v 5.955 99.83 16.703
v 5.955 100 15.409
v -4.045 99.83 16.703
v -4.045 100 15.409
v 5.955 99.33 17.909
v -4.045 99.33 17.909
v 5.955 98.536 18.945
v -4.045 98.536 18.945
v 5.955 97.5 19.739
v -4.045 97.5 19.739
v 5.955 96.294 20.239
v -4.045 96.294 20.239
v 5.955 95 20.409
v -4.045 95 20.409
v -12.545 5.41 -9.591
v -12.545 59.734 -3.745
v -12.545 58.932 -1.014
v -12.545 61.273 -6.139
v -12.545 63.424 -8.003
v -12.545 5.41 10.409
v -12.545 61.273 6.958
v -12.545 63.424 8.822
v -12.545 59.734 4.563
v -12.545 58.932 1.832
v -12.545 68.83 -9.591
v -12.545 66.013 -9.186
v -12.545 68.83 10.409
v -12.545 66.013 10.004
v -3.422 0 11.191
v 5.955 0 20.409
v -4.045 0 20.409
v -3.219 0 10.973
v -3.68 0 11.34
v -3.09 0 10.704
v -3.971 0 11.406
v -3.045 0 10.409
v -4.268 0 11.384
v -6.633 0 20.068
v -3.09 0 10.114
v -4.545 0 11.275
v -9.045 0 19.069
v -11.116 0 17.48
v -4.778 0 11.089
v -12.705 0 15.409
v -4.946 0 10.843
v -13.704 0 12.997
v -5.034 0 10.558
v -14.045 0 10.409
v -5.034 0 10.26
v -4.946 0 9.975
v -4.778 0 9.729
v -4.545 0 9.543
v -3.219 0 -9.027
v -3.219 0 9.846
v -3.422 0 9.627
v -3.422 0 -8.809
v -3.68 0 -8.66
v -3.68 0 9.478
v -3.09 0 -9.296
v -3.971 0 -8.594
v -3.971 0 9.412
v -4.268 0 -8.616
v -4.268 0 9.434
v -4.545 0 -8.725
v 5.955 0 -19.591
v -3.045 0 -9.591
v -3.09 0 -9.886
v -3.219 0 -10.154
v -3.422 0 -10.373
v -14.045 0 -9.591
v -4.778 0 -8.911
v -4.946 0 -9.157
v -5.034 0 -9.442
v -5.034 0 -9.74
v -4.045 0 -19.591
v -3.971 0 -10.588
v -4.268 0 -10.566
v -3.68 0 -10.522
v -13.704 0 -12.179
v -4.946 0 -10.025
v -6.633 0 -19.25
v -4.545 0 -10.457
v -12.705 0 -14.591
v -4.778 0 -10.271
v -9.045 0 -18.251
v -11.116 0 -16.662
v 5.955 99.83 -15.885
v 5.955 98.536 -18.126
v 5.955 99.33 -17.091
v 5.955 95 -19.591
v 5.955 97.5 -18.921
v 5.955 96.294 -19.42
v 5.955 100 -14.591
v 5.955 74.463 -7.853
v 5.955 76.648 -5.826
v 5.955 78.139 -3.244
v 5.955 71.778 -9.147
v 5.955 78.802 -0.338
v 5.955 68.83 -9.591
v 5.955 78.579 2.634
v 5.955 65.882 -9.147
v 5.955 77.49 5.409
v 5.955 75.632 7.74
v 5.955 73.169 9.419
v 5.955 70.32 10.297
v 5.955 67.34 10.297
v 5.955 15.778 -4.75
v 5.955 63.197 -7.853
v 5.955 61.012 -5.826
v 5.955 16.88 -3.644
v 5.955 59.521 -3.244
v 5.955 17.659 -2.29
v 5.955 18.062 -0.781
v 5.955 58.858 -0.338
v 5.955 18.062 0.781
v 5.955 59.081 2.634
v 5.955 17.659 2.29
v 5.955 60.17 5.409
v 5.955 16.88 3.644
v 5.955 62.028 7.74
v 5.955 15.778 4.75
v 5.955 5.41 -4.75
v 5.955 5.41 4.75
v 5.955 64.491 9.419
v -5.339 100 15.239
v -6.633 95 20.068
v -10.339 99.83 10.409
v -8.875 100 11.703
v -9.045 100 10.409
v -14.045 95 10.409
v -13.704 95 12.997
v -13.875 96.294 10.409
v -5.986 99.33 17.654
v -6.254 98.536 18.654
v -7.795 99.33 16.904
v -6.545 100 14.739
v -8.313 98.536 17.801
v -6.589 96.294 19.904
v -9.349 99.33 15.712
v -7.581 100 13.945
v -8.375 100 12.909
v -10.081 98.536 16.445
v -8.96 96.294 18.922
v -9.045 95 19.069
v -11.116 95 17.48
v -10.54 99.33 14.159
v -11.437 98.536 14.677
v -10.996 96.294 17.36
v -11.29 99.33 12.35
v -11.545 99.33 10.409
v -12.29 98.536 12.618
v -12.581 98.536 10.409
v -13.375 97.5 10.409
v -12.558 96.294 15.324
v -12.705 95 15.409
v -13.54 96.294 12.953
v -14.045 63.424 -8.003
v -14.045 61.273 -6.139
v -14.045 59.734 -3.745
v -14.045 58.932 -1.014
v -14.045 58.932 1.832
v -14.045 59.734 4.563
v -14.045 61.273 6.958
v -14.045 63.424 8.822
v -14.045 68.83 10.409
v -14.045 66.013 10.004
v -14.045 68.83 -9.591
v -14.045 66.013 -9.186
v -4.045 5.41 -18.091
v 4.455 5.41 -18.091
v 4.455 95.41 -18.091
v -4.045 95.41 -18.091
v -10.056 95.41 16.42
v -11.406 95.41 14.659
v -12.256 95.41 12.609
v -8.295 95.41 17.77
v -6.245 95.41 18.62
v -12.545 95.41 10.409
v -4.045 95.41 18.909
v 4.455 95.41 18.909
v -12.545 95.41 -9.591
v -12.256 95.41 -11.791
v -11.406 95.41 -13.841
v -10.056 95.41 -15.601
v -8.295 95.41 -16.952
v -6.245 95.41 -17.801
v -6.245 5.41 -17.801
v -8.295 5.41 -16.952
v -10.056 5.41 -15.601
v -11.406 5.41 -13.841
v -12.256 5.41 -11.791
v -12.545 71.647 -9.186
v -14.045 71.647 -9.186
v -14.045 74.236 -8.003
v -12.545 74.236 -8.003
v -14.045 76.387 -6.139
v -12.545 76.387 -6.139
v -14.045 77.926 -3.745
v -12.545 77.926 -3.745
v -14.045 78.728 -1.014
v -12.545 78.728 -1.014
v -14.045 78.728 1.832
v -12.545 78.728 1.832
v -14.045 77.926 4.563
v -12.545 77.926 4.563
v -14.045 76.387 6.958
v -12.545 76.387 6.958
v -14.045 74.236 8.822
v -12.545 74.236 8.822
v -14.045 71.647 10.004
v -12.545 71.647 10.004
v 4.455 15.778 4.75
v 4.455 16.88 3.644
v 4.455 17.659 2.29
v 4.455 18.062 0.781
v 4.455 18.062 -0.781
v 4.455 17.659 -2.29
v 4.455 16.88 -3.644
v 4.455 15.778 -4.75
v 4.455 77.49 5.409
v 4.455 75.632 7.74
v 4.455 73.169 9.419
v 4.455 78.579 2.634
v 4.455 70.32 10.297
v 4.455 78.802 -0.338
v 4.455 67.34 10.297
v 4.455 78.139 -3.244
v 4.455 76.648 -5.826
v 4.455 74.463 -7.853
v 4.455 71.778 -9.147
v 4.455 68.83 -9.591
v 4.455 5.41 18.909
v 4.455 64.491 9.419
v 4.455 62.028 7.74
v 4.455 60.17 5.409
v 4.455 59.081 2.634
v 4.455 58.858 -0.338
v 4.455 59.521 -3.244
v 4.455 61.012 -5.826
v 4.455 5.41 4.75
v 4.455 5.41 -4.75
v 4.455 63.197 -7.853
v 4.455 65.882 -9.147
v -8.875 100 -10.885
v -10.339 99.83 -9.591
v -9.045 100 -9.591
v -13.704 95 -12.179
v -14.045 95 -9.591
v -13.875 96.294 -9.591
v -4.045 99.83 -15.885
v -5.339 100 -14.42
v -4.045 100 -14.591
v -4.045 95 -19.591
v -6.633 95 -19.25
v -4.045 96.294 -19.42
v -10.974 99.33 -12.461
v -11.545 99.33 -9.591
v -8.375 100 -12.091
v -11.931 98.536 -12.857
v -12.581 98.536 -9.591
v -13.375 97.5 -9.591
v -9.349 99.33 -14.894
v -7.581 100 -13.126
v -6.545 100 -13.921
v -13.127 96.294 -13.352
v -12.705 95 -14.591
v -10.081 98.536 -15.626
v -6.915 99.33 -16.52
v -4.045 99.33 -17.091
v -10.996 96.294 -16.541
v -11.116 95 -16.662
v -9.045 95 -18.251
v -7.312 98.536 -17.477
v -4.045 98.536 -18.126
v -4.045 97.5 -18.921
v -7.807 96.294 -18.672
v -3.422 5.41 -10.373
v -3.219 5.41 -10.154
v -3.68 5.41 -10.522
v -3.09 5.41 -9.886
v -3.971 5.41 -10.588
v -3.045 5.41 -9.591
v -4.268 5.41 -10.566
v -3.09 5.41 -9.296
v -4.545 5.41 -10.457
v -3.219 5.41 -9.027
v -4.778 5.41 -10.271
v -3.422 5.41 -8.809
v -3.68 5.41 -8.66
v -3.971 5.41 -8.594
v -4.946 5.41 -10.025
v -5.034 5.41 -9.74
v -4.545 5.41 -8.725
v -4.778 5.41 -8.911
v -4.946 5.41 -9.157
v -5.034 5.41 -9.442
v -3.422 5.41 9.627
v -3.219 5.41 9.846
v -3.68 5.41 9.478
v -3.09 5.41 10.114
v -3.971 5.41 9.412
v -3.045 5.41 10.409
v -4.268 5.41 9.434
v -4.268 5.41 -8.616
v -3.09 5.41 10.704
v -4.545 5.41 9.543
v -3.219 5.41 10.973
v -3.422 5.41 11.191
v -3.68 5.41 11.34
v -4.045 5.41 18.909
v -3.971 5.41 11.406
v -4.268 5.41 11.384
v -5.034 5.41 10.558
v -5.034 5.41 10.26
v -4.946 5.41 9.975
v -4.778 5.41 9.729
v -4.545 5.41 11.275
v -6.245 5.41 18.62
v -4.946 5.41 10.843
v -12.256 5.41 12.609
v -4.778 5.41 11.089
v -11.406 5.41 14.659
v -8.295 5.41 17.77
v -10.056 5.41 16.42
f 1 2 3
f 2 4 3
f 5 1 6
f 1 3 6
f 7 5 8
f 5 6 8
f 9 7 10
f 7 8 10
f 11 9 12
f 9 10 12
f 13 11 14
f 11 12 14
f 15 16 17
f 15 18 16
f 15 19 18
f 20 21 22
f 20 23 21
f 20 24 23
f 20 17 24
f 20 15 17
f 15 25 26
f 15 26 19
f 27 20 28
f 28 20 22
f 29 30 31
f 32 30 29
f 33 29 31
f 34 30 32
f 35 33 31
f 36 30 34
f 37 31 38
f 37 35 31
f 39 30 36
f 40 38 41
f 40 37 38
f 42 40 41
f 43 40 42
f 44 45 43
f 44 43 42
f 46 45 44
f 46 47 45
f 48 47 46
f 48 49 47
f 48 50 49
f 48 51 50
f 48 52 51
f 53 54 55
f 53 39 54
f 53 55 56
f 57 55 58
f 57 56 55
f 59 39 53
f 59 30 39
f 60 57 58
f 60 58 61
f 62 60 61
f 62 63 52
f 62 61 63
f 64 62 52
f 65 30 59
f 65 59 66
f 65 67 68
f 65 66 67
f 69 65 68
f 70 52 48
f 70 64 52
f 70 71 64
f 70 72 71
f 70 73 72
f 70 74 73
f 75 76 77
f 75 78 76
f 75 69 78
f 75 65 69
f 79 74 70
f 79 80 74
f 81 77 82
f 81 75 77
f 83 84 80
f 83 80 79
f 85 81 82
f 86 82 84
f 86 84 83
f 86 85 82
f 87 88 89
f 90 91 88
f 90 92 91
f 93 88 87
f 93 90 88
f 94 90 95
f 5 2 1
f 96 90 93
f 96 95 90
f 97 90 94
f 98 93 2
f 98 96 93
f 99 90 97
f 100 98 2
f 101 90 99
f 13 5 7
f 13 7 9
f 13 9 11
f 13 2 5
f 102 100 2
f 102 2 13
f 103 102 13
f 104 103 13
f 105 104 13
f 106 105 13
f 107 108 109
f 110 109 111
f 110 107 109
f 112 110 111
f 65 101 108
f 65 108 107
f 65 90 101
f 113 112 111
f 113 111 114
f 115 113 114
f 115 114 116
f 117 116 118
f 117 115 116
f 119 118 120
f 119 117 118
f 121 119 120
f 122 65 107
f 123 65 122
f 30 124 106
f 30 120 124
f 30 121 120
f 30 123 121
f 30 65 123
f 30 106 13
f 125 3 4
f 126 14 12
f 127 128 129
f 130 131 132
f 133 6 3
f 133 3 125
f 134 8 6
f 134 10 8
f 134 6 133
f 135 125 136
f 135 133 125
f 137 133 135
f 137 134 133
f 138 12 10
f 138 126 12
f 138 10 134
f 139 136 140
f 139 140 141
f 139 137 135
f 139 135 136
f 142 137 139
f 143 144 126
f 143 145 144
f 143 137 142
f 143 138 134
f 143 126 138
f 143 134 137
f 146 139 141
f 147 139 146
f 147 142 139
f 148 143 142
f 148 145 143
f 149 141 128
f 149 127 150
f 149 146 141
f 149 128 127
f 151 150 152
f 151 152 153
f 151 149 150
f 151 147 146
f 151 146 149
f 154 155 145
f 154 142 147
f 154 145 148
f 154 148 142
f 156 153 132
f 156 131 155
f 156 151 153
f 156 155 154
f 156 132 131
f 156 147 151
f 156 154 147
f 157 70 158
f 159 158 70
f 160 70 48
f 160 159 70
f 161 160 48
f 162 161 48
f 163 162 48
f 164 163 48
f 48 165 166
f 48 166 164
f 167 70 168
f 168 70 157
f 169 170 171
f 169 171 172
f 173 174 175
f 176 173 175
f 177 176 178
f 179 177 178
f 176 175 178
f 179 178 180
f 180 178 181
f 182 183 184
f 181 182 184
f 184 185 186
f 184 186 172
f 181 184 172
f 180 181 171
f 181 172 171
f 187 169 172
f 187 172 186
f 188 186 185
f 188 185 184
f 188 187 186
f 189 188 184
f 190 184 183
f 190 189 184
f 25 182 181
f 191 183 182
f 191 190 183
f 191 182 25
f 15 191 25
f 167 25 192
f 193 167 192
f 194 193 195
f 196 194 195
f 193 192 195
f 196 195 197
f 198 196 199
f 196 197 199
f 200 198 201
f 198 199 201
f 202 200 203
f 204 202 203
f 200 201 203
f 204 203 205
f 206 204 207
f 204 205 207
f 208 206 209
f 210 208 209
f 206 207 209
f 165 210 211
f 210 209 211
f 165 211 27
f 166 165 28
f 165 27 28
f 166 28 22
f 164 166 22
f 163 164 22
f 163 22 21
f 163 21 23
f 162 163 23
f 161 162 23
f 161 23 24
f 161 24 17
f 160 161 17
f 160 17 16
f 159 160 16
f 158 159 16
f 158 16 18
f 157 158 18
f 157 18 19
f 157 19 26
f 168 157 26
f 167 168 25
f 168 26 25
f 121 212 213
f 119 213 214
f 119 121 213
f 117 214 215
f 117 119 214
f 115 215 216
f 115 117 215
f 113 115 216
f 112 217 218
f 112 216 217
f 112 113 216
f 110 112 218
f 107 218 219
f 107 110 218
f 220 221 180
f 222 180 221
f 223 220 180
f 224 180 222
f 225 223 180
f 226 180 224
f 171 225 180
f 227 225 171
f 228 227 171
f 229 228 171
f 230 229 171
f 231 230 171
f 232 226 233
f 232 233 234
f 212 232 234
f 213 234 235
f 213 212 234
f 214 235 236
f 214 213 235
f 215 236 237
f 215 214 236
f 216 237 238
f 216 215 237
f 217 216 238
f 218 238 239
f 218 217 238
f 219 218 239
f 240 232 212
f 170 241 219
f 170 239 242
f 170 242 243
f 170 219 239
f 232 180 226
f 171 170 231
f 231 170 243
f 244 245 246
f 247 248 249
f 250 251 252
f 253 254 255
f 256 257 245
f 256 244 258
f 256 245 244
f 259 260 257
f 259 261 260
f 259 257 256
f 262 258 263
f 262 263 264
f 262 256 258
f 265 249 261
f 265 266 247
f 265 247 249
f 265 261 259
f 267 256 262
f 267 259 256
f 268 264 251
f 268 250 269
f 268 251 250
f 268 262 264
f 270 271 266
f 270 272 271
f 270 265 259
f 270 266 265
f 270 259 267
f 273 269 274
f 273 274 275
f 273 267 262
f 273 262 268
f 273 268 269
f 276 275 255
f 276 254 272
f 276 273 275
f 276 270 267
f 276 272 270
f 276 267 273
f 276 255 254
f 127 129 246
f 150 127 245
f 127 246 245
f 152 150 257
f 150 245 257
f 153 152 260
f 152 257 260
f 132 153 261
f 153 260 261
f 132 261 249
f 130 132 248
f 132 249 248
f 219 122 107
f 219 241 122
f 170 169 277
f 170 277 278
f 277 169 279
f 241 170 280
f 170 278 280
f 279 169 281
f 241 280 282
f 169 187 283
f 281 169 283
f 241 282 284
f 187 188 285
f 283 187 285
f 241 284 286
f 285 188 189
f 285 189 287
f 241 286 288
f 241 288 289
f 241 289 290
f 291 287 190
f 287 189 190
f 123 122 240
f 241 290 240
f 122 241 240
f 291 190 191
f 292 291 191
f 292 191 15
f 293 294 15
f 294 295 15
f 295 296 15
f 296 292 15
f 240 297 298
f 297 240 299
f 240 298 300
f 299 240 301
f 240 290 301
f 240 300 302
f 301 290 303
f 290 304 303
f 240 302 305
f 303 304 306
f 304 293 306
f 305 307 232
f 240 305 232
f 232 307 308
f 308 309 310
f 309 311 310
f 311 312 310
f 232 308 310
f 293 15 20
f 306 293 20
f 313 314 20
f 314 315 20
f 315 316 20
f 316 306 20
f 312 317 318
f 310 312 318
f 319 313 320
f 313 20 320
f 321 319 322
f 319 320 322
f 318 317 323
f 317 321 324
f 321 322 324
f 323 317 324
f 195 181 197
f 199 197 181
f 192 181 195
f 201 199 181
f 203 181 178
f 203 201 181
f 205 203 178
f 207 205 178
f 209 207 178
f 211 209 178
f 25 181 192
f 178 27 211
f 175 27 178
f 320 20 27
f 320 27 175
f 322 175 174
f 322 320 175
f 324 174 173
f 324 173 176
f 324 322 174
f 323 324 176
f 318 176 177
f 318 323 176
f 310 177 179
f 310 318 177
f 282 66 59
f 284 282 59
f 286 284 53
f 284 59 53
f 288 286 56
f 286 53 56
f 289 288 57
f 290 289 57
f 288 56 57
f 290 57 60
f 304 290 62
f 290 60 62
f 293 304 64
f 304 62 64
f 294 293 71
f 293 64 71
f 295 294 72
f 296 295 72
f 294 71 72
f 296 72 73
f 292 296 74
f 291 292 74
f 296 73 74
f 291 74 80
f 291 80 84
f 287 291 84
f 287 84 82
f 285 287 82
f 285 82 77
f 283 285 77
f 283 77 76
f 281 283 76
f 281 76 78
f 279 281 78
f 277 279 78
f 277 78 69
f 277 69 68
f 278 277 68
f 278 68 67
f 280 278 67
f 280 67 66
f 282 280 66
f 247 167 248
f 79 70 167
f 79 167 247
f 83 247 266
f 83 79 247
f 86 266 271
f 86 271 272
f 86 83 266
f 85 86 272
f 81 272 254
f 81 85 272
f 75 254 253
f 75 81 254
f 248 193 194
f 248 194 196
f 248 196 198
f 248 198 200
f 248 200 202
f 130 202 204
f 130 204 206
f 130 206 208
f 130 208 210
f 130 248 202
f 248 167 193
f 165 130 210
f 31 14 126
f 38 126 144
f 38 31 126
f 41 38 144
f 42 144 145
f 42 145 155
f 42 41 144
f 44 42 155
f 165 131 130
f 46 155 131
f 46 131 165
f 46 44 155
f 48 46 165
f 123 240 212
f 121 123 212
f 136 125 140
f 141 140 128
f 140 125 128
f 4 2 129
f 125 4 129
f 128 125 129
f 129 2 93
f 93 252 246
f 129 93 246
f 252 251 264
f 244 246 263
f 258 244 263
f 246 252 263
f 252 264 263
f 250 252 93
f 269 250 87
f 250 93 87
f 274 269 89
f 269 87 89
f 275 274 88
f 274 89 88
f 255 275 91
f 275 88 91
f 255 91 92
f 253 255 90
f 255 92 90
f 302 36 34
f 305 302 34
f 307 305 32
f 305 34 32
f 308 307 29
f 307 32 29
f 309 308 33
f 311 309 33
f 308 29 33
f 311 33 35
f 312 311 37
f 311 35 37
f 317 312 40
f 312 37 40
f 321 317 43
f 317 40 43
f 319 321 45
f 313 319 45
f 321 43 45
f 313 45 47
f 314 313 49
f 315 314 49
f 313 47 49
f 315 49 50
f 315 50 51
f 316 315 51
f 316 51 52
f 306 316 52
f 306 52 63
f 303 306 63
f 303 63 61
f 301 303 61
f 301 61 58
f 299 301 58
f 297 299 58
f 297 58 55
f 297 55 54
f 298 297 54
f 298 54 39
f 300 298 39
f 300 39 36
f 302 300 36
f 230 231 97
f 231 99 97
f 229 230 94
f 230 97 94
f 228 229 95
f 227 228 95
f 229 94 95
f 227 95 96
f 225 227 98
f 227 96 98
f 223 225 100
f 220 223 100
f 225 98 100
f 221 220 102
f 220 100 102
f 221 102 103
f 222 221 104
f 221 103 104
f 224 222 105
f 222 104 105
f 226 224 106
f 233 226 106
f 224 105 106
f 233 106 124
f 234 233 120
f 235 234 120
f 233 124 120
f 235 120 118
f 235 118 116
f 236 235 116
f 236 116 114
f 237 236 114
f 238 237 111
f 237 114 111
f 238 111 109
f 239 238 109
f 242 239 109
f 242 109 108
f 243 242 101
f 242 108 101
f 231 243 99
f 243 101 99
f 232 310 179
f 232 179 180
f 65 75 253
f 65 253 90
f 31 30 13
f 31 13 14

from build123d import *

# Parameters (mm, degrees)
BOSS_EXTRUDE1_DEPTH = 100
SKETCH2_R           = 10
CUT_EXTRUDE1_DEPTH  = 7.5
CUT_EXTRUDE2_DEPTH  = 4.75
SKETCH6_R           = 1
CUT_EXTRUDE3_DEPTH  = 6
SKETCH7_W           = 9.5
SKETCH7_H           = 7.367856256
CUT_EXTRUDE4_DEPTH  = 6
SKETCH8_W           = 9.5
SKETCH8_H           = 7.367856256
BOSS_EXTRUDE2_DEPTH = 12.5
SKETCH10_R          = 10
CUT_EXTRUDE5_DEPTH  = 68
FILLET1_R           = 5
CUT_EXTRUDE6_DEPTH  = 5
SKETCH13_W          = 9.5
SKETCH13_H          = 3
CUT_EXTRUDE7_DEPTH  = 5
CUT_EXTRUDE8_DEPTH  = 12.5
CUT_EXTRUDE9_DEPTH  = 5
SKETCH17_W          = 11
SKETCH17_H          = 9.5
CUT_EXTRUDE11_DEPTH = 90


with BuildPart() as part:
    # Sketch1 → Boss-Extrude1 (new body)
    with BuildSketch(Plane(origin=(0, 0, 0), x_dir=(1, 0, 0), z_dir=(0, 1, 0))):
        with BuildLine():
            Line((-4.0452326, 19.590813971), (5.9547674, 19.590813971))
            Line((5.9547674, 19.590813971), (5.9547674, -0.409186029))
            Line((5.9547674, -0.409186029), (5.9547674, -20.409186029))
            Line((5.9547674, -20.409186029), (-4.0452326, -20.409186029))
            ThreePointArc((-4.0452326, -20.409186029), (-11.116300412, -17.48025384), (-14.0452326, -10.409186029))
            Line((-14.0452326, -10.409186029), (-14.0452326, 9.590813971))
            ThreePointArc((-14.0452326, 9.590813971), (-11.116300412, 16.661881783), (-4.0452326, 19.590813971))
        make_face()
    extrude(amount=BOSS_EXTRUDE1_DEPTH)

    # Sketch2 → Cut-Extrude1 (cut)
    with BuildSketch(Plane(origin=(5.9547674, 0, 0), x_dir=(0, 0, -1), z_dir=(1, 0, 0))):
        with Locations((-0.409186029, 68.83)):
            Circle(SKETCH2_R)
    extrude(amount=-CUT_EXTRUDE1_DEPTH, mode=Mode.SUBTRACT)

    # Sketch4 → Cut-Extrude2 (cut, symmetric)
    with BuildSketch(Plane.XY):
        Polygon((-1.5452326, 89.777572113), (3.4547674, 89.777572113), (3.4547674, 12.777572113), (3.4547674, 5.409715857), (-15.452876316, 5.409715857), (-15.452876316, 12.777572113), (-1.5452326, 12.777572113), align=None)
    extrude(amount=CUT_EXTRUDE2_DEPTH, both=True, mode=Mode.SUBTRACT)

    # Sketch6 → Cut-Extrude3 (cut)
    with BuildSketch(Plane.XZ):
        with Locations((-4.0452326, -9.590813971)):
            Circle(SKETCH6_R)
        with Locations((-4.0452326, 10.409186029)):
            Circle(SKETCH6_R)
    extrude(amount=-CUT_EXTRUDE3_DEPTH, mode=Mode.SUBTRACT)

    # Sketch7 → Cut-Extrude4 (cut)
    with BuildSketch(Plane.ZY.offset(-3.4547674)):
        with Locations((0, 9.093643985)):
            Rectangle(SKETCH7_W, SKETCH7_H)
    extrude(amount=-CUT_EXTRUDE4_DEPTH, mode=Mode.SUBTRACT)

    # Sketch8 → Boss-Extrude2 (add)
    with BuildSketch(Plane.ZY.offset(14.0452326)):
        with Locations((0, 9.093643985)):
            Rectangle(SKETCH8_W, SKETCH8_H)
    extrude(amount=-BOSS_EXTRUDE2_DEPTH)

    # Sketch10 → Cut-Extrude5 (cut)
    with BuildSketch(Plane(origin=(5.9547674, 0, 0), x_dir=(0, 0, -1), z_dir=(1, 0, 0))):
        with Locations((-0.409186029, 68.83)):
            Circle(SKETCH10_R)
    extrude(amount=-CUT_EXTRUDE5_DEPTH, mode=Mode.SUBTRACT)

    # Fillet1
    fillet1_edges = [part.edges().sort_by_distance(p)[0] for p in [
        (-11.116300412, 100, -16.661881783),
        (-14.0452326, 100, 0.409186029),
        (-11.116300412, 100, 17.48025384),
        (0.9547674, 100, 20.409186029),
        (0.9547674, 100, -19.590813971),
    ]]
    fillet(fillet1_edges, radius=FILLET1_R)

    # Sketch11 → Cut-Extrude6 (cut)
    with BuildSketch(Plane(origin=(-1.5452326, 0, 0), x_dir=(0, 0, -1), z_dir=(1, 0, 0))):
        with BuildLine():
            Line((-4.75, 59.821263459), (-4.75, 5.409715857))
            Line((-4.75, 5.409715857), (4.75, 5.409715857))
            Line((4.75, 5.409715857), (4.75, 60.263623898))
            ThreePointArc((4.75, 60.263623898), (0.055952548, 58.840823552), (-4.75, 59.821263459))
        make_face()
    extrude(amount=-CUT_EXTRUDE6_DEPTH, mode=Mode.SUBTRACT)

    # Sketch13 → Cut-Extrude7 (cut)
    with BuildSketch(Plane(origin=(5.9547674, 0, 0), x_dir=(0, 0, -1), z_dir=(1, 0, 0))):
        with Locations((0, 14.277572113)):
            Rectangle(SKETCH13_W, SKETCH13_H)
    extrude(amount=-CUT_EXTRUDE7_DEPTH, mode=Mode.SUBTRACT)

    # Sketch14 → Cut-Extrude8 (cut)
    with BuildSketch(Plane(origin=(5.9547674, 0, 0), x_dir=(0, 0, -1), z_dir=(1, 0, 0))):
        with BuildLine():
            Line((4.75, 15.777572113), (-4.75, 15.777572113))
            ThreePointArc((-4.75, 15.777572113), (0, 18.113561026), (4.75, 15.777572113))
        make_face()
    extrude(amount=-CUT_EXTRUDE8_DEPTH, mode=Mode.SUBTRACT)

    # Sketch16 → Cut-Extrude9 (cut)
    with BuildSketch(Plane(origin=(-1.5452326, 0, 0), x_dir=(0, 0, -1), z_dir=(1, 0, 0))):
        with BuildLine():
            ThreePointArc((-4.75, 89.777572113), (0, 93.055148297), (4.75, 89.777572113))
            Line((4.75, 89.777572113), (-4.75, 89.777572113))
        make_face()
    extrude(amount=CUT_EXTRUDE9_DEPTH, mode=Mode.SUBTRACT)

    # Sketch17 → Cut-Extrude11 (cut)
    with BuildSketch(Plane(origin=(0, 5.409715857, 0), x_dir=(1, 0, 0), z_dir=(0, 1, 0))):
        with BuildLine():
            Line((4.4547674, 4.75), (4.4547674, 18.090813971))
            Line((4.4547674, 18.090813971), (-4.0452326, 18.090813971))
            ThreePointArc((-4.0452326, 18.090813971), (-10.05564024, 15.601221612), (-12.5452326, 9.590813971))
            Line((-12.5452326, 9.590813971), (-12.5452326, -10.409186029))
            ThreePointArc((-12.5452326, -10.409186029), (-10.05564024, -16.419593669), (-4.0452326, -18.909186029))
            Line((-4.0452326, -18.909186029), (4.4547674, -18.909186029))
            Line((4.4547674, -18.909186029), (4.4547674, -4.75))
            Line((4.4547674, -4.75), (-6.5452326, -4.75))
            Line((-6.5452326, -4.75), (-6.5452326, 4.75))
            Line((-6.5452326, 4.75), (4.4547674, 4.75))
        make_face()
        with Locations((-1.0452326, 0)):
            Rectangle(SKETCH17_W, SKETCH17_H)
    extrude(amount=CUT_EXTRUDE11_DEPTH, mode=Mode.SUBTRACT)


solid = part.part
